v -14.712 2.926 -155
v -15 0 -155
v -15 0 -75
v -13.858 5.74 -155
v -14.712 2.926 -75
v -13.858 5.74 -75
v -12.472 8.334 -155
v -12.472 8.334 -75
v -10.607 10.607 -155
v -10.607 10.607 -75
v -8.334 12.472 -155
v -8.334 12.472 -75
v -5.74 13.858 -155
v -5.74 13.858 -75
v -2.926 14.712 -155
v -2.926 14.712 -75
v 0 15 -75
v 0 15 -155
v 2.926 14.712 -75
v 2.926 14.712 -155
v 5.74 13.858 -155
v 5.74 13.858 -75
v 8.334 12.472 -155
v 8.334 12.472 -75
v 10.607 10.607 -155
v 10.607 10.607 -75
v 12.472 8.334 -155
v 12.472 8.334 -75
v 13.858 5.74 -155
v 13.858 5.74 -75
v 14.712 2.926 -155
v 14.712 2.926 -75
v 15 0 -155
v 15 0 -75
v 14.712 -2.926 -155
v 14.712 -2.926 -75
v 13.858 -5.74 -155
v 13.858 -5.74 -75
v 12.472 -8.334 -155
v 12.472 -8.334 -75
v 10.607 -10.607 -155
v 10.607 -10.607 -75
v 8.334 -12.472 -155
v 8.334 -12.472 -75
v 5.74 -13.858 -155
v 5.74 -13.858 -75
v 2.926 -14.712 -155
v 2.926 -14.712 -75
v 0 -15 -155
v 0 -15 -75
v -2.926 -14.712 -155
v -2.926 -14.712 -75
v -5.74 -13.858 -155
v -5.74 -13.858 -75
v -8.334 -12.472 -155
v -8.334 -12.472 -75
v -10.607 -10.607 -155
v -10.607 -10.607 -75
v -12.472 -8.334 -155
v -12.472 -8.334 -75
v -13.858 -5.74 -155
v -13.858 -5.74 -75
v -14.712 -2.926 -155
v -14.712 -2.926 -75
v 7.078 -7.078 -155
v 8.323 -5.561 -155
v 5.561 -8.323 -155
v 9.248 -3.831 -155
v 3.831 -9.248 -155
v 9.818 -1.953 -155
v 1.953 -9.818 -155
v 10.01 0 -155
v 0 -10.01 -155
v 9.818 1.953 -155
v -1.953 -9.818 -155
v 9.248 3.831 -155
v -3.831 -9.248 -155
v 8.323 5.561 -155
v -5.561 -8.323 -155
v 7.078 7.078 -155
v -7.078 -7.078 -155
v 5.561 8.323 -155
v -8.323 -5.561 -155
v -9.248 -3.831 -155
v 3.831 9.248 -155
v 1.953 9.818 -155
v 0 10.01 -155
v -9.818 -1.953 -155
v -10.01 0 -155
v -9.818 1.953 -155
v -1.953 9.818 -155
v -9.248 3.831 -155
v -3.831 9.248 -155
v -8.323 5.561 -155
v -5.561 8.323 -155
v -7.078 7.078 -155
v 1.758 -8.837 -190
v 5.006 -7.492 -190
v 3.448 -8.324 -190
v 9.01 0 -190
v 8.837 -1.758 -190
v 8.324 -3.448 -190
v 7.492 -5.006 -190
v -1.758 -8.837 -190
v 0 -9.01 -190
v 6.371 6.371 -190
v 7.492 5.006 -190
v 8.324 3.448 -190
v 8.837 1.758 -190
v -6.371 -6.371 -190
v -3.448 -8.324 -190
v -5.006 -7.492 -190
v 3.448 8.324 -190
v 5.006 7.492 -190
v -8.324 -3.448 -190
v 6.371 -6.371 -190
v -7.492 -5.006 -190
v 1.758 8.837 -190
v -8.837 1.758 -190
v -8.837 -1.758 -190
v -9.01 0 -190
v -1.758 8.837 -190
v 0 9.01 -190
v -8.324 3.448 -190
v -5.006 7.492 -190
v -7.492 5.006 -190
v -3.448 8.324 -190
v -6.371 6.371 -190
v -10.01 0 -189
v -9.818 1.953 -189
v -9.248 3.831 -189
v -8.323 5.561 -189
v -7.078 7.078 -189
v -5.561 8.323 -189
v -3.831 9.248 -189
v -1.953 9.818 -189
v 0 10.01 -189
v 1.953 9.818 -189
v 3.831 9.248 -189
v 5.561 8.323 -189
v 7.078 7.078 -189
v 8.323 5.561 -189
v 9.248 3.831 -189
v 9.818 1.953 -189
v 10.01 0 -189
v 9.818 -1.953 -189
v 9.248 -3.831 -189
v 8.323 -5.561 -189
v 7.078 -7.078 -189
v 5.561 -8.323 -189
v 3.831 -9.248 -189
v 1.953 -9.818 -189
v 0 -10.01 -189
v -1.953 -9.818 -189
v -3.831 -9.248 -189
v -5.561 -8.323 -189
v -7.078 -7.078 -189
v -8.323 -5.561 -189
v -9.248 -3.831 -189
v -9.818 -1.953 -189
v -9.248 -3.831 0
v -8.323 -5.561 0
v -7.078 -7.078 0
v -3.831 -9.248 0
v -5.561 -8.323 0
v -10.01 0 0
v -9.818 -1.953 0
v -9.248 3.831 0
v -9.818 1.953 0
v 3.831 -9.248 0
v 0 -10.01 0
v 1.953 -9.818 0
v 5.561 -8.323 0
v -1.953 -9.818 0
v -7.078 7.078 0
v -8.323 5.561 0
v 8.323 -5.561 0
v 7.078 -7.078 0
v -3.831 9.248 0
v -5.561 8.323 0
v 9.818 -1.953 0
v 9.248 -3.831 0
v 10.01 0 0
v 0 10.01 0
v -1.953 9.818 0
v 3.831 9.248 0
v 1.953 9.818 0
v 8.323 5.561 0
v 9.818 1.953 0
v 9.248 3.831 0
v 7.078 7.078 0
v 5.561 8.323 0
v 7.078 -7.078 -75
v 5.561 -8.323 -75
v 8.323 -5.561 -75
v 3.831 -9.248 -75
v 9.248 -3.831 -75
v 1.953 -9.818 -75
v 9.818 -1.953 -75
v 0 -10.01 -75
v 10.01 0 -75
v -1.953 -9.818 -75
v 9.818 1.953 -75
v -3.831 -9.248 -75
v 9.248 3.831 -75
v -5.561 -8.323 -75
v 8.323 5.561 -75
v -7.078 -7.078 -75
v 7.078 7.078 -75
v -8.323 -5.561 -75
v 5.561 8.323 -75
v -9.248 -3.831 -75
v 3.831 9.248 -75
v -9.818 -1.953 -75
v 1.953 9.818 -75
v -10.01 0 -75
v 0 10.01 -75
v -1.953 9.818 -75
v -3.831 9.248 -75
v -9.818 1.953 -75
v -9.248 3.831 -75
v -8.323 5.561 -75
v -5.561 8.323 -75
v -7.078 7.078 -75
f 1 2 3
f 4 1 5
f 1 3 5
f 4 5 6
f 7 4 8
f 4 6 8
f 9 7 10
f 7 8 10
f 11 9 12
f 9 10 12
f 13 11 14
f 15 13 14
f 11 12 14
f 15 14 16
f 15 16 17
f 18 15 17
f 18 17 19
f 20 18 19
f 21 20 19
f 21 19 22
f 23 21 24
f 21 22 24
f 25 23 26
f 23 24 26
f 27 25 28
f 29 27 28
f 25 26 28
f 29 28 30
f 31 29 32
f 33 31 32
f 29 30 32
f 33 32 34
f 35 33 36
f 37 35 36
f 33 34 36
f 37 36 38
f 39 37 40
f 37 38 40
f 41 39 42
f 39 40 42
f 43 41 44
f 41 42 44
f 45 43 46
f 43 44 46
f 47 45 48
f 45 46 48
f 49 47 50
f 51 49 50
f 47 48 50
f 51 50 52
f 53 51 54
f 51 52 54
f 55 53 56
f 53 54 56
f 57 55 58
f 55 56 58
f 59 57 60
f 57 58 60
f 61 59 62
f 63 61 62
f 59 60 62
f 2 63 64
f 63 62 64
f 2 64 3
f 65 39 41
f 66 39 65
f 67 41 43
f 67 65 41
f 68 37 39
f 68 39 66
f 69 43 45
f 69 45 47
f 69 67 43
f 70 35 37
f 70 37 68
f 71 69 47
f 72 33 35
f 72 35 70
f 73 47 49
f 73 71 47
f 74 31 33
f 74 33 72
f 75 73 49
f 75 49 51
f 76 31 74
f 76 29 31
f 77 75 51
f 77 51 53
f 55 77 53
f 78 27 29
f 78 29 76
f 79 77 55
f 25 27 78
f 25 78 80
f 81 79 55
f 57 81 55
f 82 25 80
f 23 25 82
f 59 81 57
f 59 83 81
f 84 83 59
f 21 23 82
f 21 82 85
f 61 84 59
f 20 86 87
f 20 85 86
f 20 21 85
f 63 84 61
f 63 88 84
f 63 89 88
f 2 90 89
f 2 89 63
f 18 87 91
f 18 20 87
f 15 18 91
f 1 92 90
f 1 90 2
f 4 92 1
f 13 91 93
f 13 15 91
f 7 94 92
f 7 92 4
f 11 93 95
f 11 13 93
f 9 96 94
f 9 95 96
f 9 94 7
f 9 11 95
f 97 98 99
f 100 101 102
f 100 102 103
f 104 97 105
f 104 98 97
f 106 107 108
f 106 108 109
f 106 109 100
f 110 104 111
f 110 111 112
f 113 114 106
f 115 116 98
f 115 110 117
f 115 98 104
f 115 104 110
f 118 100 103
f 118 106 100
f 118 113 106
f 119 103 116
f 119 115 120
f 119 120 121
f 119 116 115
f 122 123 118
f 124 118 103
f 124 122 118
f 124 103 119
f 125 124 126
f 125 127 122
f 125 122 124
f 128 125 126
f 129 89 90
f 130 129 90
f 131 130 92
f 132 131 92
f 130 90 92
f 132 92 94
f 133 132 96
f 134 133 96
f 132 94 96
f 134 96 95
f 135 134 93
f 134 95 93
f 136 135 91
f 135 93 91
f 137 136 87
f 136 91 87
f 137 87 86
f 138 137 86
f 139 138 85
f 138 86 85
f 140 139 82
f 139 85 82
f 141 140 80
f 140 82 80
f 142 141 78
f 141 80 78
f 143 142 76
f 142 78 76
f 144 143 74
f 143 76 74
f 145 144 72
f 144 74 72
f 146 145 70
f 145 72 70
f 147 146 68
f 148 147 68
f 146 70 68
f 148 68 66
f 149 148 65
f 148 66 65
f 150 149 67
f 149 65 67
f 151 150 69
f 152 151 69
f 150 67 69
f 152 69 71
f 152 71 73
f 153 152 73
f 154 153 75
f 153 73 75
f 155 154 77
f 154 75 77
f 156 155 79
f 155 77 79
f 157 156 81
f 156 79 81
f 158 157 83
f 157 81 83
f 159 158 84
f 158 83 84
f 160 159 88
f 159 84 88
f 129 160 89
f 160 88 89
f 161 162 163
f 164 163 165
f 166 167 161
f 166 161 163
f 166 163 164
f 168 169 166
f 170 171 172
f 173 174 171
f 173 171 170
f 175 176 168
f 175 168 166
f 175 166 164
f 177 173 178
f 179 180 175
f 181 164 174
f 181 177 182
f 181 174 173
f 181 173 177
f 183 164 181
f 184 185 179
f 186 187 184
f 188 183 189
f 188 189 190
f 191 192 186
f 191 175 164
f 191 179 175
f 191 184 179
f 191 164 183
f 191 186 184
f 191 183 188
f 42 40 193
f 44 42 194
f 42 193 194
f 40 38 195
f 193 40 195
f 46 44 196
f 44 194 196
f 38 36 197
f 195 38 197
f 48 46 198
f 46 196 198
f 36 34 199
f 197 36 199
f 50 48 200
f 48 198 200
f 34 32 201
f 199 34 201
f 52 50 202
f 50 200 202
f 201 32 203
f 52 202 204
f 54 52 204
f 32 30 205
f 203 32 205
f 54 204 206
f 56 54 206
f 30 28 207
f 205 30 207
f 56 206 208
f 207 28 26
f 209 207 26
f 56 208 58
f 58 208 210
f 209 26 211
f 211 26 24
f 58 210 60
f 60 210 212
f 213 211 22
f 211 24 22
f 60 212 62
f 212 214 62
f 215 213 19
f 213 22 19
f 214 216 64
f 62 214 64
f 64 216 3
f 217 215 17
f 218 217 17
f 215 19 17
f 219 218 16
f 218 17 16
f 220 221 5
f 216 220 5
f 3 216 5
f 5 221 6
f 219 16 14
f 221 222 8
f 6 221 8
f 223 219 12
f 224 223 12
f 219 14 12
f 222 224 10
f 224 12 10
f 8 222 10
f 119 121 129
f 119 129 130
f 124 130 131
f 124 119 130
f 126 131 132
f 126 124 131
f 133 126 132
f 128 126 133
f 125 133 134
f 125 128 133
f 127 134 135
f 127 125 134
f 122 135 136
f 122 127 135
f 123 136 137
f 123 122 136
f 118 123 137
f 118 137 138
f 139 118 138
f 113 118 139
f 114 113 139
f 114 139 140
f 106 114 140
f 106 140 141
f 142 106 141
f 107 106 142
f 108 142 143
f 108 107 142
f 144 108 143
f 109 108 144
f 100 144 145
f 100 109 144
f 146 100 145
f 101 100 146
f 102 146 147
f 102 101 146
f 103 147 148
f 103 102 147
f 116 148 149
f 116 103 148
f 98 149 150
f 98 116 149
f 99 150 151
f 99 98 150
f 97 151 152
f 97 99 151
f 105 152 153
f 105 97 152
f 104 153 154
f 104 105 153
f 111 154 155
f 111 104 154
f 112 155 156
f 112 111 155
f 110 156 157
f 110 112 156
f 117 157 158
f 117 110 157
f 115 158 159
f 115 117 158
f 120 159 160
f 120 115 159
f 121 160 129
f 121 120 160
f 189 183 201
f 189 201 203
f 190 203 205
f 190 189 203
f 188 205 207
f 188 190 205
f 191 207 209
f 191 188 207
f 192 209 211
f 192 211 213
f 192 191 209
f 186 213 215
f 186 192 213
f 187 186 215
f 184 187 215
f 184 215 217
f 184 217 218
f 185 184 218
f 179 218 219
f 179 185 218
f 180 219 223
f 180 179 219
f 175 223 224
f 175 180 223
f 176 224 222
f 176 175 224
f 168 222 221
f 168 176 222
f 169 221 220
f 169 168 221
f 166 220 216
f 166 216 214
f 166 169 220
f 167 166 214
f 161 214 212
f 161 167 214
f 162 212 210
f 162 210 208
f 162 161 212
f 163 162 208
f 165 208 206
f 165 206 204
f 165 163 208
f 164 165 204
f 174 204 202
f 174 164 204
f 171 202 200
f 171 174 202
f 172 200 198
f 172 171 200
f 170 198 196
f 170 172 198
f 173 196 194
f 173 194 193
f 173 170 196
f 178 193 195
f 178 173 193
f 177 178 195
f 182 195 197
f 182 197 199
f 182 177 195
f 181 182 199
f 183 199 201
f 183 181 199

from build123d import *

# Parameters (mm, degrees)
SKETCH1_R           = 10.01
BOSS_EXTRUDE1_DEPTH = 75
SKETCH2_R           = 15
BOSS_EXTRUDE2_DEPTH = 80
SKETCH3_R           = 10.01
BOSS_EXTRUDE3_DEPTH = 35
CHAMFER1_SIZE       = 1


with BuildPart() as part:
    # Sketch1 → Boss-Extrude1 (new body)
    with BuildSketch(Plane.XY):
        Circle(SKETCH1_R)
    extrude(amount=-BOSS_EXTRUDE1_DEPTH)

    # Sketch2 → Boss-Extrude2 (add)
    with BuildSketch(Plane(origin=(0, 0, -75), x_dir=(-1, 0, 0), z_dir=(0, 0, -1))):
        Circle(SKETCH2_R)
    extrude(amount=BOSS_EXTRUDE2_DEPTH)

    # Sketch3 → Boss-Extrude3 (add)
    with BuildSketch(Plane(origin=(0, 0, -155), x_dir=(-1, 0, 0), z_dir=(0, 0, -1))):
        Circle(SKETCH3_R)
    extrude(amount=BOSS_EXTRUDE3_DEPTH)

    # Chamfer1
    chamfer1_edges = [part.edges().sort_by_distance(p)[0] for p in [
        (10.01, 0, -190),
    ]]
    chamfer(chamfer1_edges, length=CHAMFER1_SIZE)


solid = part.part
